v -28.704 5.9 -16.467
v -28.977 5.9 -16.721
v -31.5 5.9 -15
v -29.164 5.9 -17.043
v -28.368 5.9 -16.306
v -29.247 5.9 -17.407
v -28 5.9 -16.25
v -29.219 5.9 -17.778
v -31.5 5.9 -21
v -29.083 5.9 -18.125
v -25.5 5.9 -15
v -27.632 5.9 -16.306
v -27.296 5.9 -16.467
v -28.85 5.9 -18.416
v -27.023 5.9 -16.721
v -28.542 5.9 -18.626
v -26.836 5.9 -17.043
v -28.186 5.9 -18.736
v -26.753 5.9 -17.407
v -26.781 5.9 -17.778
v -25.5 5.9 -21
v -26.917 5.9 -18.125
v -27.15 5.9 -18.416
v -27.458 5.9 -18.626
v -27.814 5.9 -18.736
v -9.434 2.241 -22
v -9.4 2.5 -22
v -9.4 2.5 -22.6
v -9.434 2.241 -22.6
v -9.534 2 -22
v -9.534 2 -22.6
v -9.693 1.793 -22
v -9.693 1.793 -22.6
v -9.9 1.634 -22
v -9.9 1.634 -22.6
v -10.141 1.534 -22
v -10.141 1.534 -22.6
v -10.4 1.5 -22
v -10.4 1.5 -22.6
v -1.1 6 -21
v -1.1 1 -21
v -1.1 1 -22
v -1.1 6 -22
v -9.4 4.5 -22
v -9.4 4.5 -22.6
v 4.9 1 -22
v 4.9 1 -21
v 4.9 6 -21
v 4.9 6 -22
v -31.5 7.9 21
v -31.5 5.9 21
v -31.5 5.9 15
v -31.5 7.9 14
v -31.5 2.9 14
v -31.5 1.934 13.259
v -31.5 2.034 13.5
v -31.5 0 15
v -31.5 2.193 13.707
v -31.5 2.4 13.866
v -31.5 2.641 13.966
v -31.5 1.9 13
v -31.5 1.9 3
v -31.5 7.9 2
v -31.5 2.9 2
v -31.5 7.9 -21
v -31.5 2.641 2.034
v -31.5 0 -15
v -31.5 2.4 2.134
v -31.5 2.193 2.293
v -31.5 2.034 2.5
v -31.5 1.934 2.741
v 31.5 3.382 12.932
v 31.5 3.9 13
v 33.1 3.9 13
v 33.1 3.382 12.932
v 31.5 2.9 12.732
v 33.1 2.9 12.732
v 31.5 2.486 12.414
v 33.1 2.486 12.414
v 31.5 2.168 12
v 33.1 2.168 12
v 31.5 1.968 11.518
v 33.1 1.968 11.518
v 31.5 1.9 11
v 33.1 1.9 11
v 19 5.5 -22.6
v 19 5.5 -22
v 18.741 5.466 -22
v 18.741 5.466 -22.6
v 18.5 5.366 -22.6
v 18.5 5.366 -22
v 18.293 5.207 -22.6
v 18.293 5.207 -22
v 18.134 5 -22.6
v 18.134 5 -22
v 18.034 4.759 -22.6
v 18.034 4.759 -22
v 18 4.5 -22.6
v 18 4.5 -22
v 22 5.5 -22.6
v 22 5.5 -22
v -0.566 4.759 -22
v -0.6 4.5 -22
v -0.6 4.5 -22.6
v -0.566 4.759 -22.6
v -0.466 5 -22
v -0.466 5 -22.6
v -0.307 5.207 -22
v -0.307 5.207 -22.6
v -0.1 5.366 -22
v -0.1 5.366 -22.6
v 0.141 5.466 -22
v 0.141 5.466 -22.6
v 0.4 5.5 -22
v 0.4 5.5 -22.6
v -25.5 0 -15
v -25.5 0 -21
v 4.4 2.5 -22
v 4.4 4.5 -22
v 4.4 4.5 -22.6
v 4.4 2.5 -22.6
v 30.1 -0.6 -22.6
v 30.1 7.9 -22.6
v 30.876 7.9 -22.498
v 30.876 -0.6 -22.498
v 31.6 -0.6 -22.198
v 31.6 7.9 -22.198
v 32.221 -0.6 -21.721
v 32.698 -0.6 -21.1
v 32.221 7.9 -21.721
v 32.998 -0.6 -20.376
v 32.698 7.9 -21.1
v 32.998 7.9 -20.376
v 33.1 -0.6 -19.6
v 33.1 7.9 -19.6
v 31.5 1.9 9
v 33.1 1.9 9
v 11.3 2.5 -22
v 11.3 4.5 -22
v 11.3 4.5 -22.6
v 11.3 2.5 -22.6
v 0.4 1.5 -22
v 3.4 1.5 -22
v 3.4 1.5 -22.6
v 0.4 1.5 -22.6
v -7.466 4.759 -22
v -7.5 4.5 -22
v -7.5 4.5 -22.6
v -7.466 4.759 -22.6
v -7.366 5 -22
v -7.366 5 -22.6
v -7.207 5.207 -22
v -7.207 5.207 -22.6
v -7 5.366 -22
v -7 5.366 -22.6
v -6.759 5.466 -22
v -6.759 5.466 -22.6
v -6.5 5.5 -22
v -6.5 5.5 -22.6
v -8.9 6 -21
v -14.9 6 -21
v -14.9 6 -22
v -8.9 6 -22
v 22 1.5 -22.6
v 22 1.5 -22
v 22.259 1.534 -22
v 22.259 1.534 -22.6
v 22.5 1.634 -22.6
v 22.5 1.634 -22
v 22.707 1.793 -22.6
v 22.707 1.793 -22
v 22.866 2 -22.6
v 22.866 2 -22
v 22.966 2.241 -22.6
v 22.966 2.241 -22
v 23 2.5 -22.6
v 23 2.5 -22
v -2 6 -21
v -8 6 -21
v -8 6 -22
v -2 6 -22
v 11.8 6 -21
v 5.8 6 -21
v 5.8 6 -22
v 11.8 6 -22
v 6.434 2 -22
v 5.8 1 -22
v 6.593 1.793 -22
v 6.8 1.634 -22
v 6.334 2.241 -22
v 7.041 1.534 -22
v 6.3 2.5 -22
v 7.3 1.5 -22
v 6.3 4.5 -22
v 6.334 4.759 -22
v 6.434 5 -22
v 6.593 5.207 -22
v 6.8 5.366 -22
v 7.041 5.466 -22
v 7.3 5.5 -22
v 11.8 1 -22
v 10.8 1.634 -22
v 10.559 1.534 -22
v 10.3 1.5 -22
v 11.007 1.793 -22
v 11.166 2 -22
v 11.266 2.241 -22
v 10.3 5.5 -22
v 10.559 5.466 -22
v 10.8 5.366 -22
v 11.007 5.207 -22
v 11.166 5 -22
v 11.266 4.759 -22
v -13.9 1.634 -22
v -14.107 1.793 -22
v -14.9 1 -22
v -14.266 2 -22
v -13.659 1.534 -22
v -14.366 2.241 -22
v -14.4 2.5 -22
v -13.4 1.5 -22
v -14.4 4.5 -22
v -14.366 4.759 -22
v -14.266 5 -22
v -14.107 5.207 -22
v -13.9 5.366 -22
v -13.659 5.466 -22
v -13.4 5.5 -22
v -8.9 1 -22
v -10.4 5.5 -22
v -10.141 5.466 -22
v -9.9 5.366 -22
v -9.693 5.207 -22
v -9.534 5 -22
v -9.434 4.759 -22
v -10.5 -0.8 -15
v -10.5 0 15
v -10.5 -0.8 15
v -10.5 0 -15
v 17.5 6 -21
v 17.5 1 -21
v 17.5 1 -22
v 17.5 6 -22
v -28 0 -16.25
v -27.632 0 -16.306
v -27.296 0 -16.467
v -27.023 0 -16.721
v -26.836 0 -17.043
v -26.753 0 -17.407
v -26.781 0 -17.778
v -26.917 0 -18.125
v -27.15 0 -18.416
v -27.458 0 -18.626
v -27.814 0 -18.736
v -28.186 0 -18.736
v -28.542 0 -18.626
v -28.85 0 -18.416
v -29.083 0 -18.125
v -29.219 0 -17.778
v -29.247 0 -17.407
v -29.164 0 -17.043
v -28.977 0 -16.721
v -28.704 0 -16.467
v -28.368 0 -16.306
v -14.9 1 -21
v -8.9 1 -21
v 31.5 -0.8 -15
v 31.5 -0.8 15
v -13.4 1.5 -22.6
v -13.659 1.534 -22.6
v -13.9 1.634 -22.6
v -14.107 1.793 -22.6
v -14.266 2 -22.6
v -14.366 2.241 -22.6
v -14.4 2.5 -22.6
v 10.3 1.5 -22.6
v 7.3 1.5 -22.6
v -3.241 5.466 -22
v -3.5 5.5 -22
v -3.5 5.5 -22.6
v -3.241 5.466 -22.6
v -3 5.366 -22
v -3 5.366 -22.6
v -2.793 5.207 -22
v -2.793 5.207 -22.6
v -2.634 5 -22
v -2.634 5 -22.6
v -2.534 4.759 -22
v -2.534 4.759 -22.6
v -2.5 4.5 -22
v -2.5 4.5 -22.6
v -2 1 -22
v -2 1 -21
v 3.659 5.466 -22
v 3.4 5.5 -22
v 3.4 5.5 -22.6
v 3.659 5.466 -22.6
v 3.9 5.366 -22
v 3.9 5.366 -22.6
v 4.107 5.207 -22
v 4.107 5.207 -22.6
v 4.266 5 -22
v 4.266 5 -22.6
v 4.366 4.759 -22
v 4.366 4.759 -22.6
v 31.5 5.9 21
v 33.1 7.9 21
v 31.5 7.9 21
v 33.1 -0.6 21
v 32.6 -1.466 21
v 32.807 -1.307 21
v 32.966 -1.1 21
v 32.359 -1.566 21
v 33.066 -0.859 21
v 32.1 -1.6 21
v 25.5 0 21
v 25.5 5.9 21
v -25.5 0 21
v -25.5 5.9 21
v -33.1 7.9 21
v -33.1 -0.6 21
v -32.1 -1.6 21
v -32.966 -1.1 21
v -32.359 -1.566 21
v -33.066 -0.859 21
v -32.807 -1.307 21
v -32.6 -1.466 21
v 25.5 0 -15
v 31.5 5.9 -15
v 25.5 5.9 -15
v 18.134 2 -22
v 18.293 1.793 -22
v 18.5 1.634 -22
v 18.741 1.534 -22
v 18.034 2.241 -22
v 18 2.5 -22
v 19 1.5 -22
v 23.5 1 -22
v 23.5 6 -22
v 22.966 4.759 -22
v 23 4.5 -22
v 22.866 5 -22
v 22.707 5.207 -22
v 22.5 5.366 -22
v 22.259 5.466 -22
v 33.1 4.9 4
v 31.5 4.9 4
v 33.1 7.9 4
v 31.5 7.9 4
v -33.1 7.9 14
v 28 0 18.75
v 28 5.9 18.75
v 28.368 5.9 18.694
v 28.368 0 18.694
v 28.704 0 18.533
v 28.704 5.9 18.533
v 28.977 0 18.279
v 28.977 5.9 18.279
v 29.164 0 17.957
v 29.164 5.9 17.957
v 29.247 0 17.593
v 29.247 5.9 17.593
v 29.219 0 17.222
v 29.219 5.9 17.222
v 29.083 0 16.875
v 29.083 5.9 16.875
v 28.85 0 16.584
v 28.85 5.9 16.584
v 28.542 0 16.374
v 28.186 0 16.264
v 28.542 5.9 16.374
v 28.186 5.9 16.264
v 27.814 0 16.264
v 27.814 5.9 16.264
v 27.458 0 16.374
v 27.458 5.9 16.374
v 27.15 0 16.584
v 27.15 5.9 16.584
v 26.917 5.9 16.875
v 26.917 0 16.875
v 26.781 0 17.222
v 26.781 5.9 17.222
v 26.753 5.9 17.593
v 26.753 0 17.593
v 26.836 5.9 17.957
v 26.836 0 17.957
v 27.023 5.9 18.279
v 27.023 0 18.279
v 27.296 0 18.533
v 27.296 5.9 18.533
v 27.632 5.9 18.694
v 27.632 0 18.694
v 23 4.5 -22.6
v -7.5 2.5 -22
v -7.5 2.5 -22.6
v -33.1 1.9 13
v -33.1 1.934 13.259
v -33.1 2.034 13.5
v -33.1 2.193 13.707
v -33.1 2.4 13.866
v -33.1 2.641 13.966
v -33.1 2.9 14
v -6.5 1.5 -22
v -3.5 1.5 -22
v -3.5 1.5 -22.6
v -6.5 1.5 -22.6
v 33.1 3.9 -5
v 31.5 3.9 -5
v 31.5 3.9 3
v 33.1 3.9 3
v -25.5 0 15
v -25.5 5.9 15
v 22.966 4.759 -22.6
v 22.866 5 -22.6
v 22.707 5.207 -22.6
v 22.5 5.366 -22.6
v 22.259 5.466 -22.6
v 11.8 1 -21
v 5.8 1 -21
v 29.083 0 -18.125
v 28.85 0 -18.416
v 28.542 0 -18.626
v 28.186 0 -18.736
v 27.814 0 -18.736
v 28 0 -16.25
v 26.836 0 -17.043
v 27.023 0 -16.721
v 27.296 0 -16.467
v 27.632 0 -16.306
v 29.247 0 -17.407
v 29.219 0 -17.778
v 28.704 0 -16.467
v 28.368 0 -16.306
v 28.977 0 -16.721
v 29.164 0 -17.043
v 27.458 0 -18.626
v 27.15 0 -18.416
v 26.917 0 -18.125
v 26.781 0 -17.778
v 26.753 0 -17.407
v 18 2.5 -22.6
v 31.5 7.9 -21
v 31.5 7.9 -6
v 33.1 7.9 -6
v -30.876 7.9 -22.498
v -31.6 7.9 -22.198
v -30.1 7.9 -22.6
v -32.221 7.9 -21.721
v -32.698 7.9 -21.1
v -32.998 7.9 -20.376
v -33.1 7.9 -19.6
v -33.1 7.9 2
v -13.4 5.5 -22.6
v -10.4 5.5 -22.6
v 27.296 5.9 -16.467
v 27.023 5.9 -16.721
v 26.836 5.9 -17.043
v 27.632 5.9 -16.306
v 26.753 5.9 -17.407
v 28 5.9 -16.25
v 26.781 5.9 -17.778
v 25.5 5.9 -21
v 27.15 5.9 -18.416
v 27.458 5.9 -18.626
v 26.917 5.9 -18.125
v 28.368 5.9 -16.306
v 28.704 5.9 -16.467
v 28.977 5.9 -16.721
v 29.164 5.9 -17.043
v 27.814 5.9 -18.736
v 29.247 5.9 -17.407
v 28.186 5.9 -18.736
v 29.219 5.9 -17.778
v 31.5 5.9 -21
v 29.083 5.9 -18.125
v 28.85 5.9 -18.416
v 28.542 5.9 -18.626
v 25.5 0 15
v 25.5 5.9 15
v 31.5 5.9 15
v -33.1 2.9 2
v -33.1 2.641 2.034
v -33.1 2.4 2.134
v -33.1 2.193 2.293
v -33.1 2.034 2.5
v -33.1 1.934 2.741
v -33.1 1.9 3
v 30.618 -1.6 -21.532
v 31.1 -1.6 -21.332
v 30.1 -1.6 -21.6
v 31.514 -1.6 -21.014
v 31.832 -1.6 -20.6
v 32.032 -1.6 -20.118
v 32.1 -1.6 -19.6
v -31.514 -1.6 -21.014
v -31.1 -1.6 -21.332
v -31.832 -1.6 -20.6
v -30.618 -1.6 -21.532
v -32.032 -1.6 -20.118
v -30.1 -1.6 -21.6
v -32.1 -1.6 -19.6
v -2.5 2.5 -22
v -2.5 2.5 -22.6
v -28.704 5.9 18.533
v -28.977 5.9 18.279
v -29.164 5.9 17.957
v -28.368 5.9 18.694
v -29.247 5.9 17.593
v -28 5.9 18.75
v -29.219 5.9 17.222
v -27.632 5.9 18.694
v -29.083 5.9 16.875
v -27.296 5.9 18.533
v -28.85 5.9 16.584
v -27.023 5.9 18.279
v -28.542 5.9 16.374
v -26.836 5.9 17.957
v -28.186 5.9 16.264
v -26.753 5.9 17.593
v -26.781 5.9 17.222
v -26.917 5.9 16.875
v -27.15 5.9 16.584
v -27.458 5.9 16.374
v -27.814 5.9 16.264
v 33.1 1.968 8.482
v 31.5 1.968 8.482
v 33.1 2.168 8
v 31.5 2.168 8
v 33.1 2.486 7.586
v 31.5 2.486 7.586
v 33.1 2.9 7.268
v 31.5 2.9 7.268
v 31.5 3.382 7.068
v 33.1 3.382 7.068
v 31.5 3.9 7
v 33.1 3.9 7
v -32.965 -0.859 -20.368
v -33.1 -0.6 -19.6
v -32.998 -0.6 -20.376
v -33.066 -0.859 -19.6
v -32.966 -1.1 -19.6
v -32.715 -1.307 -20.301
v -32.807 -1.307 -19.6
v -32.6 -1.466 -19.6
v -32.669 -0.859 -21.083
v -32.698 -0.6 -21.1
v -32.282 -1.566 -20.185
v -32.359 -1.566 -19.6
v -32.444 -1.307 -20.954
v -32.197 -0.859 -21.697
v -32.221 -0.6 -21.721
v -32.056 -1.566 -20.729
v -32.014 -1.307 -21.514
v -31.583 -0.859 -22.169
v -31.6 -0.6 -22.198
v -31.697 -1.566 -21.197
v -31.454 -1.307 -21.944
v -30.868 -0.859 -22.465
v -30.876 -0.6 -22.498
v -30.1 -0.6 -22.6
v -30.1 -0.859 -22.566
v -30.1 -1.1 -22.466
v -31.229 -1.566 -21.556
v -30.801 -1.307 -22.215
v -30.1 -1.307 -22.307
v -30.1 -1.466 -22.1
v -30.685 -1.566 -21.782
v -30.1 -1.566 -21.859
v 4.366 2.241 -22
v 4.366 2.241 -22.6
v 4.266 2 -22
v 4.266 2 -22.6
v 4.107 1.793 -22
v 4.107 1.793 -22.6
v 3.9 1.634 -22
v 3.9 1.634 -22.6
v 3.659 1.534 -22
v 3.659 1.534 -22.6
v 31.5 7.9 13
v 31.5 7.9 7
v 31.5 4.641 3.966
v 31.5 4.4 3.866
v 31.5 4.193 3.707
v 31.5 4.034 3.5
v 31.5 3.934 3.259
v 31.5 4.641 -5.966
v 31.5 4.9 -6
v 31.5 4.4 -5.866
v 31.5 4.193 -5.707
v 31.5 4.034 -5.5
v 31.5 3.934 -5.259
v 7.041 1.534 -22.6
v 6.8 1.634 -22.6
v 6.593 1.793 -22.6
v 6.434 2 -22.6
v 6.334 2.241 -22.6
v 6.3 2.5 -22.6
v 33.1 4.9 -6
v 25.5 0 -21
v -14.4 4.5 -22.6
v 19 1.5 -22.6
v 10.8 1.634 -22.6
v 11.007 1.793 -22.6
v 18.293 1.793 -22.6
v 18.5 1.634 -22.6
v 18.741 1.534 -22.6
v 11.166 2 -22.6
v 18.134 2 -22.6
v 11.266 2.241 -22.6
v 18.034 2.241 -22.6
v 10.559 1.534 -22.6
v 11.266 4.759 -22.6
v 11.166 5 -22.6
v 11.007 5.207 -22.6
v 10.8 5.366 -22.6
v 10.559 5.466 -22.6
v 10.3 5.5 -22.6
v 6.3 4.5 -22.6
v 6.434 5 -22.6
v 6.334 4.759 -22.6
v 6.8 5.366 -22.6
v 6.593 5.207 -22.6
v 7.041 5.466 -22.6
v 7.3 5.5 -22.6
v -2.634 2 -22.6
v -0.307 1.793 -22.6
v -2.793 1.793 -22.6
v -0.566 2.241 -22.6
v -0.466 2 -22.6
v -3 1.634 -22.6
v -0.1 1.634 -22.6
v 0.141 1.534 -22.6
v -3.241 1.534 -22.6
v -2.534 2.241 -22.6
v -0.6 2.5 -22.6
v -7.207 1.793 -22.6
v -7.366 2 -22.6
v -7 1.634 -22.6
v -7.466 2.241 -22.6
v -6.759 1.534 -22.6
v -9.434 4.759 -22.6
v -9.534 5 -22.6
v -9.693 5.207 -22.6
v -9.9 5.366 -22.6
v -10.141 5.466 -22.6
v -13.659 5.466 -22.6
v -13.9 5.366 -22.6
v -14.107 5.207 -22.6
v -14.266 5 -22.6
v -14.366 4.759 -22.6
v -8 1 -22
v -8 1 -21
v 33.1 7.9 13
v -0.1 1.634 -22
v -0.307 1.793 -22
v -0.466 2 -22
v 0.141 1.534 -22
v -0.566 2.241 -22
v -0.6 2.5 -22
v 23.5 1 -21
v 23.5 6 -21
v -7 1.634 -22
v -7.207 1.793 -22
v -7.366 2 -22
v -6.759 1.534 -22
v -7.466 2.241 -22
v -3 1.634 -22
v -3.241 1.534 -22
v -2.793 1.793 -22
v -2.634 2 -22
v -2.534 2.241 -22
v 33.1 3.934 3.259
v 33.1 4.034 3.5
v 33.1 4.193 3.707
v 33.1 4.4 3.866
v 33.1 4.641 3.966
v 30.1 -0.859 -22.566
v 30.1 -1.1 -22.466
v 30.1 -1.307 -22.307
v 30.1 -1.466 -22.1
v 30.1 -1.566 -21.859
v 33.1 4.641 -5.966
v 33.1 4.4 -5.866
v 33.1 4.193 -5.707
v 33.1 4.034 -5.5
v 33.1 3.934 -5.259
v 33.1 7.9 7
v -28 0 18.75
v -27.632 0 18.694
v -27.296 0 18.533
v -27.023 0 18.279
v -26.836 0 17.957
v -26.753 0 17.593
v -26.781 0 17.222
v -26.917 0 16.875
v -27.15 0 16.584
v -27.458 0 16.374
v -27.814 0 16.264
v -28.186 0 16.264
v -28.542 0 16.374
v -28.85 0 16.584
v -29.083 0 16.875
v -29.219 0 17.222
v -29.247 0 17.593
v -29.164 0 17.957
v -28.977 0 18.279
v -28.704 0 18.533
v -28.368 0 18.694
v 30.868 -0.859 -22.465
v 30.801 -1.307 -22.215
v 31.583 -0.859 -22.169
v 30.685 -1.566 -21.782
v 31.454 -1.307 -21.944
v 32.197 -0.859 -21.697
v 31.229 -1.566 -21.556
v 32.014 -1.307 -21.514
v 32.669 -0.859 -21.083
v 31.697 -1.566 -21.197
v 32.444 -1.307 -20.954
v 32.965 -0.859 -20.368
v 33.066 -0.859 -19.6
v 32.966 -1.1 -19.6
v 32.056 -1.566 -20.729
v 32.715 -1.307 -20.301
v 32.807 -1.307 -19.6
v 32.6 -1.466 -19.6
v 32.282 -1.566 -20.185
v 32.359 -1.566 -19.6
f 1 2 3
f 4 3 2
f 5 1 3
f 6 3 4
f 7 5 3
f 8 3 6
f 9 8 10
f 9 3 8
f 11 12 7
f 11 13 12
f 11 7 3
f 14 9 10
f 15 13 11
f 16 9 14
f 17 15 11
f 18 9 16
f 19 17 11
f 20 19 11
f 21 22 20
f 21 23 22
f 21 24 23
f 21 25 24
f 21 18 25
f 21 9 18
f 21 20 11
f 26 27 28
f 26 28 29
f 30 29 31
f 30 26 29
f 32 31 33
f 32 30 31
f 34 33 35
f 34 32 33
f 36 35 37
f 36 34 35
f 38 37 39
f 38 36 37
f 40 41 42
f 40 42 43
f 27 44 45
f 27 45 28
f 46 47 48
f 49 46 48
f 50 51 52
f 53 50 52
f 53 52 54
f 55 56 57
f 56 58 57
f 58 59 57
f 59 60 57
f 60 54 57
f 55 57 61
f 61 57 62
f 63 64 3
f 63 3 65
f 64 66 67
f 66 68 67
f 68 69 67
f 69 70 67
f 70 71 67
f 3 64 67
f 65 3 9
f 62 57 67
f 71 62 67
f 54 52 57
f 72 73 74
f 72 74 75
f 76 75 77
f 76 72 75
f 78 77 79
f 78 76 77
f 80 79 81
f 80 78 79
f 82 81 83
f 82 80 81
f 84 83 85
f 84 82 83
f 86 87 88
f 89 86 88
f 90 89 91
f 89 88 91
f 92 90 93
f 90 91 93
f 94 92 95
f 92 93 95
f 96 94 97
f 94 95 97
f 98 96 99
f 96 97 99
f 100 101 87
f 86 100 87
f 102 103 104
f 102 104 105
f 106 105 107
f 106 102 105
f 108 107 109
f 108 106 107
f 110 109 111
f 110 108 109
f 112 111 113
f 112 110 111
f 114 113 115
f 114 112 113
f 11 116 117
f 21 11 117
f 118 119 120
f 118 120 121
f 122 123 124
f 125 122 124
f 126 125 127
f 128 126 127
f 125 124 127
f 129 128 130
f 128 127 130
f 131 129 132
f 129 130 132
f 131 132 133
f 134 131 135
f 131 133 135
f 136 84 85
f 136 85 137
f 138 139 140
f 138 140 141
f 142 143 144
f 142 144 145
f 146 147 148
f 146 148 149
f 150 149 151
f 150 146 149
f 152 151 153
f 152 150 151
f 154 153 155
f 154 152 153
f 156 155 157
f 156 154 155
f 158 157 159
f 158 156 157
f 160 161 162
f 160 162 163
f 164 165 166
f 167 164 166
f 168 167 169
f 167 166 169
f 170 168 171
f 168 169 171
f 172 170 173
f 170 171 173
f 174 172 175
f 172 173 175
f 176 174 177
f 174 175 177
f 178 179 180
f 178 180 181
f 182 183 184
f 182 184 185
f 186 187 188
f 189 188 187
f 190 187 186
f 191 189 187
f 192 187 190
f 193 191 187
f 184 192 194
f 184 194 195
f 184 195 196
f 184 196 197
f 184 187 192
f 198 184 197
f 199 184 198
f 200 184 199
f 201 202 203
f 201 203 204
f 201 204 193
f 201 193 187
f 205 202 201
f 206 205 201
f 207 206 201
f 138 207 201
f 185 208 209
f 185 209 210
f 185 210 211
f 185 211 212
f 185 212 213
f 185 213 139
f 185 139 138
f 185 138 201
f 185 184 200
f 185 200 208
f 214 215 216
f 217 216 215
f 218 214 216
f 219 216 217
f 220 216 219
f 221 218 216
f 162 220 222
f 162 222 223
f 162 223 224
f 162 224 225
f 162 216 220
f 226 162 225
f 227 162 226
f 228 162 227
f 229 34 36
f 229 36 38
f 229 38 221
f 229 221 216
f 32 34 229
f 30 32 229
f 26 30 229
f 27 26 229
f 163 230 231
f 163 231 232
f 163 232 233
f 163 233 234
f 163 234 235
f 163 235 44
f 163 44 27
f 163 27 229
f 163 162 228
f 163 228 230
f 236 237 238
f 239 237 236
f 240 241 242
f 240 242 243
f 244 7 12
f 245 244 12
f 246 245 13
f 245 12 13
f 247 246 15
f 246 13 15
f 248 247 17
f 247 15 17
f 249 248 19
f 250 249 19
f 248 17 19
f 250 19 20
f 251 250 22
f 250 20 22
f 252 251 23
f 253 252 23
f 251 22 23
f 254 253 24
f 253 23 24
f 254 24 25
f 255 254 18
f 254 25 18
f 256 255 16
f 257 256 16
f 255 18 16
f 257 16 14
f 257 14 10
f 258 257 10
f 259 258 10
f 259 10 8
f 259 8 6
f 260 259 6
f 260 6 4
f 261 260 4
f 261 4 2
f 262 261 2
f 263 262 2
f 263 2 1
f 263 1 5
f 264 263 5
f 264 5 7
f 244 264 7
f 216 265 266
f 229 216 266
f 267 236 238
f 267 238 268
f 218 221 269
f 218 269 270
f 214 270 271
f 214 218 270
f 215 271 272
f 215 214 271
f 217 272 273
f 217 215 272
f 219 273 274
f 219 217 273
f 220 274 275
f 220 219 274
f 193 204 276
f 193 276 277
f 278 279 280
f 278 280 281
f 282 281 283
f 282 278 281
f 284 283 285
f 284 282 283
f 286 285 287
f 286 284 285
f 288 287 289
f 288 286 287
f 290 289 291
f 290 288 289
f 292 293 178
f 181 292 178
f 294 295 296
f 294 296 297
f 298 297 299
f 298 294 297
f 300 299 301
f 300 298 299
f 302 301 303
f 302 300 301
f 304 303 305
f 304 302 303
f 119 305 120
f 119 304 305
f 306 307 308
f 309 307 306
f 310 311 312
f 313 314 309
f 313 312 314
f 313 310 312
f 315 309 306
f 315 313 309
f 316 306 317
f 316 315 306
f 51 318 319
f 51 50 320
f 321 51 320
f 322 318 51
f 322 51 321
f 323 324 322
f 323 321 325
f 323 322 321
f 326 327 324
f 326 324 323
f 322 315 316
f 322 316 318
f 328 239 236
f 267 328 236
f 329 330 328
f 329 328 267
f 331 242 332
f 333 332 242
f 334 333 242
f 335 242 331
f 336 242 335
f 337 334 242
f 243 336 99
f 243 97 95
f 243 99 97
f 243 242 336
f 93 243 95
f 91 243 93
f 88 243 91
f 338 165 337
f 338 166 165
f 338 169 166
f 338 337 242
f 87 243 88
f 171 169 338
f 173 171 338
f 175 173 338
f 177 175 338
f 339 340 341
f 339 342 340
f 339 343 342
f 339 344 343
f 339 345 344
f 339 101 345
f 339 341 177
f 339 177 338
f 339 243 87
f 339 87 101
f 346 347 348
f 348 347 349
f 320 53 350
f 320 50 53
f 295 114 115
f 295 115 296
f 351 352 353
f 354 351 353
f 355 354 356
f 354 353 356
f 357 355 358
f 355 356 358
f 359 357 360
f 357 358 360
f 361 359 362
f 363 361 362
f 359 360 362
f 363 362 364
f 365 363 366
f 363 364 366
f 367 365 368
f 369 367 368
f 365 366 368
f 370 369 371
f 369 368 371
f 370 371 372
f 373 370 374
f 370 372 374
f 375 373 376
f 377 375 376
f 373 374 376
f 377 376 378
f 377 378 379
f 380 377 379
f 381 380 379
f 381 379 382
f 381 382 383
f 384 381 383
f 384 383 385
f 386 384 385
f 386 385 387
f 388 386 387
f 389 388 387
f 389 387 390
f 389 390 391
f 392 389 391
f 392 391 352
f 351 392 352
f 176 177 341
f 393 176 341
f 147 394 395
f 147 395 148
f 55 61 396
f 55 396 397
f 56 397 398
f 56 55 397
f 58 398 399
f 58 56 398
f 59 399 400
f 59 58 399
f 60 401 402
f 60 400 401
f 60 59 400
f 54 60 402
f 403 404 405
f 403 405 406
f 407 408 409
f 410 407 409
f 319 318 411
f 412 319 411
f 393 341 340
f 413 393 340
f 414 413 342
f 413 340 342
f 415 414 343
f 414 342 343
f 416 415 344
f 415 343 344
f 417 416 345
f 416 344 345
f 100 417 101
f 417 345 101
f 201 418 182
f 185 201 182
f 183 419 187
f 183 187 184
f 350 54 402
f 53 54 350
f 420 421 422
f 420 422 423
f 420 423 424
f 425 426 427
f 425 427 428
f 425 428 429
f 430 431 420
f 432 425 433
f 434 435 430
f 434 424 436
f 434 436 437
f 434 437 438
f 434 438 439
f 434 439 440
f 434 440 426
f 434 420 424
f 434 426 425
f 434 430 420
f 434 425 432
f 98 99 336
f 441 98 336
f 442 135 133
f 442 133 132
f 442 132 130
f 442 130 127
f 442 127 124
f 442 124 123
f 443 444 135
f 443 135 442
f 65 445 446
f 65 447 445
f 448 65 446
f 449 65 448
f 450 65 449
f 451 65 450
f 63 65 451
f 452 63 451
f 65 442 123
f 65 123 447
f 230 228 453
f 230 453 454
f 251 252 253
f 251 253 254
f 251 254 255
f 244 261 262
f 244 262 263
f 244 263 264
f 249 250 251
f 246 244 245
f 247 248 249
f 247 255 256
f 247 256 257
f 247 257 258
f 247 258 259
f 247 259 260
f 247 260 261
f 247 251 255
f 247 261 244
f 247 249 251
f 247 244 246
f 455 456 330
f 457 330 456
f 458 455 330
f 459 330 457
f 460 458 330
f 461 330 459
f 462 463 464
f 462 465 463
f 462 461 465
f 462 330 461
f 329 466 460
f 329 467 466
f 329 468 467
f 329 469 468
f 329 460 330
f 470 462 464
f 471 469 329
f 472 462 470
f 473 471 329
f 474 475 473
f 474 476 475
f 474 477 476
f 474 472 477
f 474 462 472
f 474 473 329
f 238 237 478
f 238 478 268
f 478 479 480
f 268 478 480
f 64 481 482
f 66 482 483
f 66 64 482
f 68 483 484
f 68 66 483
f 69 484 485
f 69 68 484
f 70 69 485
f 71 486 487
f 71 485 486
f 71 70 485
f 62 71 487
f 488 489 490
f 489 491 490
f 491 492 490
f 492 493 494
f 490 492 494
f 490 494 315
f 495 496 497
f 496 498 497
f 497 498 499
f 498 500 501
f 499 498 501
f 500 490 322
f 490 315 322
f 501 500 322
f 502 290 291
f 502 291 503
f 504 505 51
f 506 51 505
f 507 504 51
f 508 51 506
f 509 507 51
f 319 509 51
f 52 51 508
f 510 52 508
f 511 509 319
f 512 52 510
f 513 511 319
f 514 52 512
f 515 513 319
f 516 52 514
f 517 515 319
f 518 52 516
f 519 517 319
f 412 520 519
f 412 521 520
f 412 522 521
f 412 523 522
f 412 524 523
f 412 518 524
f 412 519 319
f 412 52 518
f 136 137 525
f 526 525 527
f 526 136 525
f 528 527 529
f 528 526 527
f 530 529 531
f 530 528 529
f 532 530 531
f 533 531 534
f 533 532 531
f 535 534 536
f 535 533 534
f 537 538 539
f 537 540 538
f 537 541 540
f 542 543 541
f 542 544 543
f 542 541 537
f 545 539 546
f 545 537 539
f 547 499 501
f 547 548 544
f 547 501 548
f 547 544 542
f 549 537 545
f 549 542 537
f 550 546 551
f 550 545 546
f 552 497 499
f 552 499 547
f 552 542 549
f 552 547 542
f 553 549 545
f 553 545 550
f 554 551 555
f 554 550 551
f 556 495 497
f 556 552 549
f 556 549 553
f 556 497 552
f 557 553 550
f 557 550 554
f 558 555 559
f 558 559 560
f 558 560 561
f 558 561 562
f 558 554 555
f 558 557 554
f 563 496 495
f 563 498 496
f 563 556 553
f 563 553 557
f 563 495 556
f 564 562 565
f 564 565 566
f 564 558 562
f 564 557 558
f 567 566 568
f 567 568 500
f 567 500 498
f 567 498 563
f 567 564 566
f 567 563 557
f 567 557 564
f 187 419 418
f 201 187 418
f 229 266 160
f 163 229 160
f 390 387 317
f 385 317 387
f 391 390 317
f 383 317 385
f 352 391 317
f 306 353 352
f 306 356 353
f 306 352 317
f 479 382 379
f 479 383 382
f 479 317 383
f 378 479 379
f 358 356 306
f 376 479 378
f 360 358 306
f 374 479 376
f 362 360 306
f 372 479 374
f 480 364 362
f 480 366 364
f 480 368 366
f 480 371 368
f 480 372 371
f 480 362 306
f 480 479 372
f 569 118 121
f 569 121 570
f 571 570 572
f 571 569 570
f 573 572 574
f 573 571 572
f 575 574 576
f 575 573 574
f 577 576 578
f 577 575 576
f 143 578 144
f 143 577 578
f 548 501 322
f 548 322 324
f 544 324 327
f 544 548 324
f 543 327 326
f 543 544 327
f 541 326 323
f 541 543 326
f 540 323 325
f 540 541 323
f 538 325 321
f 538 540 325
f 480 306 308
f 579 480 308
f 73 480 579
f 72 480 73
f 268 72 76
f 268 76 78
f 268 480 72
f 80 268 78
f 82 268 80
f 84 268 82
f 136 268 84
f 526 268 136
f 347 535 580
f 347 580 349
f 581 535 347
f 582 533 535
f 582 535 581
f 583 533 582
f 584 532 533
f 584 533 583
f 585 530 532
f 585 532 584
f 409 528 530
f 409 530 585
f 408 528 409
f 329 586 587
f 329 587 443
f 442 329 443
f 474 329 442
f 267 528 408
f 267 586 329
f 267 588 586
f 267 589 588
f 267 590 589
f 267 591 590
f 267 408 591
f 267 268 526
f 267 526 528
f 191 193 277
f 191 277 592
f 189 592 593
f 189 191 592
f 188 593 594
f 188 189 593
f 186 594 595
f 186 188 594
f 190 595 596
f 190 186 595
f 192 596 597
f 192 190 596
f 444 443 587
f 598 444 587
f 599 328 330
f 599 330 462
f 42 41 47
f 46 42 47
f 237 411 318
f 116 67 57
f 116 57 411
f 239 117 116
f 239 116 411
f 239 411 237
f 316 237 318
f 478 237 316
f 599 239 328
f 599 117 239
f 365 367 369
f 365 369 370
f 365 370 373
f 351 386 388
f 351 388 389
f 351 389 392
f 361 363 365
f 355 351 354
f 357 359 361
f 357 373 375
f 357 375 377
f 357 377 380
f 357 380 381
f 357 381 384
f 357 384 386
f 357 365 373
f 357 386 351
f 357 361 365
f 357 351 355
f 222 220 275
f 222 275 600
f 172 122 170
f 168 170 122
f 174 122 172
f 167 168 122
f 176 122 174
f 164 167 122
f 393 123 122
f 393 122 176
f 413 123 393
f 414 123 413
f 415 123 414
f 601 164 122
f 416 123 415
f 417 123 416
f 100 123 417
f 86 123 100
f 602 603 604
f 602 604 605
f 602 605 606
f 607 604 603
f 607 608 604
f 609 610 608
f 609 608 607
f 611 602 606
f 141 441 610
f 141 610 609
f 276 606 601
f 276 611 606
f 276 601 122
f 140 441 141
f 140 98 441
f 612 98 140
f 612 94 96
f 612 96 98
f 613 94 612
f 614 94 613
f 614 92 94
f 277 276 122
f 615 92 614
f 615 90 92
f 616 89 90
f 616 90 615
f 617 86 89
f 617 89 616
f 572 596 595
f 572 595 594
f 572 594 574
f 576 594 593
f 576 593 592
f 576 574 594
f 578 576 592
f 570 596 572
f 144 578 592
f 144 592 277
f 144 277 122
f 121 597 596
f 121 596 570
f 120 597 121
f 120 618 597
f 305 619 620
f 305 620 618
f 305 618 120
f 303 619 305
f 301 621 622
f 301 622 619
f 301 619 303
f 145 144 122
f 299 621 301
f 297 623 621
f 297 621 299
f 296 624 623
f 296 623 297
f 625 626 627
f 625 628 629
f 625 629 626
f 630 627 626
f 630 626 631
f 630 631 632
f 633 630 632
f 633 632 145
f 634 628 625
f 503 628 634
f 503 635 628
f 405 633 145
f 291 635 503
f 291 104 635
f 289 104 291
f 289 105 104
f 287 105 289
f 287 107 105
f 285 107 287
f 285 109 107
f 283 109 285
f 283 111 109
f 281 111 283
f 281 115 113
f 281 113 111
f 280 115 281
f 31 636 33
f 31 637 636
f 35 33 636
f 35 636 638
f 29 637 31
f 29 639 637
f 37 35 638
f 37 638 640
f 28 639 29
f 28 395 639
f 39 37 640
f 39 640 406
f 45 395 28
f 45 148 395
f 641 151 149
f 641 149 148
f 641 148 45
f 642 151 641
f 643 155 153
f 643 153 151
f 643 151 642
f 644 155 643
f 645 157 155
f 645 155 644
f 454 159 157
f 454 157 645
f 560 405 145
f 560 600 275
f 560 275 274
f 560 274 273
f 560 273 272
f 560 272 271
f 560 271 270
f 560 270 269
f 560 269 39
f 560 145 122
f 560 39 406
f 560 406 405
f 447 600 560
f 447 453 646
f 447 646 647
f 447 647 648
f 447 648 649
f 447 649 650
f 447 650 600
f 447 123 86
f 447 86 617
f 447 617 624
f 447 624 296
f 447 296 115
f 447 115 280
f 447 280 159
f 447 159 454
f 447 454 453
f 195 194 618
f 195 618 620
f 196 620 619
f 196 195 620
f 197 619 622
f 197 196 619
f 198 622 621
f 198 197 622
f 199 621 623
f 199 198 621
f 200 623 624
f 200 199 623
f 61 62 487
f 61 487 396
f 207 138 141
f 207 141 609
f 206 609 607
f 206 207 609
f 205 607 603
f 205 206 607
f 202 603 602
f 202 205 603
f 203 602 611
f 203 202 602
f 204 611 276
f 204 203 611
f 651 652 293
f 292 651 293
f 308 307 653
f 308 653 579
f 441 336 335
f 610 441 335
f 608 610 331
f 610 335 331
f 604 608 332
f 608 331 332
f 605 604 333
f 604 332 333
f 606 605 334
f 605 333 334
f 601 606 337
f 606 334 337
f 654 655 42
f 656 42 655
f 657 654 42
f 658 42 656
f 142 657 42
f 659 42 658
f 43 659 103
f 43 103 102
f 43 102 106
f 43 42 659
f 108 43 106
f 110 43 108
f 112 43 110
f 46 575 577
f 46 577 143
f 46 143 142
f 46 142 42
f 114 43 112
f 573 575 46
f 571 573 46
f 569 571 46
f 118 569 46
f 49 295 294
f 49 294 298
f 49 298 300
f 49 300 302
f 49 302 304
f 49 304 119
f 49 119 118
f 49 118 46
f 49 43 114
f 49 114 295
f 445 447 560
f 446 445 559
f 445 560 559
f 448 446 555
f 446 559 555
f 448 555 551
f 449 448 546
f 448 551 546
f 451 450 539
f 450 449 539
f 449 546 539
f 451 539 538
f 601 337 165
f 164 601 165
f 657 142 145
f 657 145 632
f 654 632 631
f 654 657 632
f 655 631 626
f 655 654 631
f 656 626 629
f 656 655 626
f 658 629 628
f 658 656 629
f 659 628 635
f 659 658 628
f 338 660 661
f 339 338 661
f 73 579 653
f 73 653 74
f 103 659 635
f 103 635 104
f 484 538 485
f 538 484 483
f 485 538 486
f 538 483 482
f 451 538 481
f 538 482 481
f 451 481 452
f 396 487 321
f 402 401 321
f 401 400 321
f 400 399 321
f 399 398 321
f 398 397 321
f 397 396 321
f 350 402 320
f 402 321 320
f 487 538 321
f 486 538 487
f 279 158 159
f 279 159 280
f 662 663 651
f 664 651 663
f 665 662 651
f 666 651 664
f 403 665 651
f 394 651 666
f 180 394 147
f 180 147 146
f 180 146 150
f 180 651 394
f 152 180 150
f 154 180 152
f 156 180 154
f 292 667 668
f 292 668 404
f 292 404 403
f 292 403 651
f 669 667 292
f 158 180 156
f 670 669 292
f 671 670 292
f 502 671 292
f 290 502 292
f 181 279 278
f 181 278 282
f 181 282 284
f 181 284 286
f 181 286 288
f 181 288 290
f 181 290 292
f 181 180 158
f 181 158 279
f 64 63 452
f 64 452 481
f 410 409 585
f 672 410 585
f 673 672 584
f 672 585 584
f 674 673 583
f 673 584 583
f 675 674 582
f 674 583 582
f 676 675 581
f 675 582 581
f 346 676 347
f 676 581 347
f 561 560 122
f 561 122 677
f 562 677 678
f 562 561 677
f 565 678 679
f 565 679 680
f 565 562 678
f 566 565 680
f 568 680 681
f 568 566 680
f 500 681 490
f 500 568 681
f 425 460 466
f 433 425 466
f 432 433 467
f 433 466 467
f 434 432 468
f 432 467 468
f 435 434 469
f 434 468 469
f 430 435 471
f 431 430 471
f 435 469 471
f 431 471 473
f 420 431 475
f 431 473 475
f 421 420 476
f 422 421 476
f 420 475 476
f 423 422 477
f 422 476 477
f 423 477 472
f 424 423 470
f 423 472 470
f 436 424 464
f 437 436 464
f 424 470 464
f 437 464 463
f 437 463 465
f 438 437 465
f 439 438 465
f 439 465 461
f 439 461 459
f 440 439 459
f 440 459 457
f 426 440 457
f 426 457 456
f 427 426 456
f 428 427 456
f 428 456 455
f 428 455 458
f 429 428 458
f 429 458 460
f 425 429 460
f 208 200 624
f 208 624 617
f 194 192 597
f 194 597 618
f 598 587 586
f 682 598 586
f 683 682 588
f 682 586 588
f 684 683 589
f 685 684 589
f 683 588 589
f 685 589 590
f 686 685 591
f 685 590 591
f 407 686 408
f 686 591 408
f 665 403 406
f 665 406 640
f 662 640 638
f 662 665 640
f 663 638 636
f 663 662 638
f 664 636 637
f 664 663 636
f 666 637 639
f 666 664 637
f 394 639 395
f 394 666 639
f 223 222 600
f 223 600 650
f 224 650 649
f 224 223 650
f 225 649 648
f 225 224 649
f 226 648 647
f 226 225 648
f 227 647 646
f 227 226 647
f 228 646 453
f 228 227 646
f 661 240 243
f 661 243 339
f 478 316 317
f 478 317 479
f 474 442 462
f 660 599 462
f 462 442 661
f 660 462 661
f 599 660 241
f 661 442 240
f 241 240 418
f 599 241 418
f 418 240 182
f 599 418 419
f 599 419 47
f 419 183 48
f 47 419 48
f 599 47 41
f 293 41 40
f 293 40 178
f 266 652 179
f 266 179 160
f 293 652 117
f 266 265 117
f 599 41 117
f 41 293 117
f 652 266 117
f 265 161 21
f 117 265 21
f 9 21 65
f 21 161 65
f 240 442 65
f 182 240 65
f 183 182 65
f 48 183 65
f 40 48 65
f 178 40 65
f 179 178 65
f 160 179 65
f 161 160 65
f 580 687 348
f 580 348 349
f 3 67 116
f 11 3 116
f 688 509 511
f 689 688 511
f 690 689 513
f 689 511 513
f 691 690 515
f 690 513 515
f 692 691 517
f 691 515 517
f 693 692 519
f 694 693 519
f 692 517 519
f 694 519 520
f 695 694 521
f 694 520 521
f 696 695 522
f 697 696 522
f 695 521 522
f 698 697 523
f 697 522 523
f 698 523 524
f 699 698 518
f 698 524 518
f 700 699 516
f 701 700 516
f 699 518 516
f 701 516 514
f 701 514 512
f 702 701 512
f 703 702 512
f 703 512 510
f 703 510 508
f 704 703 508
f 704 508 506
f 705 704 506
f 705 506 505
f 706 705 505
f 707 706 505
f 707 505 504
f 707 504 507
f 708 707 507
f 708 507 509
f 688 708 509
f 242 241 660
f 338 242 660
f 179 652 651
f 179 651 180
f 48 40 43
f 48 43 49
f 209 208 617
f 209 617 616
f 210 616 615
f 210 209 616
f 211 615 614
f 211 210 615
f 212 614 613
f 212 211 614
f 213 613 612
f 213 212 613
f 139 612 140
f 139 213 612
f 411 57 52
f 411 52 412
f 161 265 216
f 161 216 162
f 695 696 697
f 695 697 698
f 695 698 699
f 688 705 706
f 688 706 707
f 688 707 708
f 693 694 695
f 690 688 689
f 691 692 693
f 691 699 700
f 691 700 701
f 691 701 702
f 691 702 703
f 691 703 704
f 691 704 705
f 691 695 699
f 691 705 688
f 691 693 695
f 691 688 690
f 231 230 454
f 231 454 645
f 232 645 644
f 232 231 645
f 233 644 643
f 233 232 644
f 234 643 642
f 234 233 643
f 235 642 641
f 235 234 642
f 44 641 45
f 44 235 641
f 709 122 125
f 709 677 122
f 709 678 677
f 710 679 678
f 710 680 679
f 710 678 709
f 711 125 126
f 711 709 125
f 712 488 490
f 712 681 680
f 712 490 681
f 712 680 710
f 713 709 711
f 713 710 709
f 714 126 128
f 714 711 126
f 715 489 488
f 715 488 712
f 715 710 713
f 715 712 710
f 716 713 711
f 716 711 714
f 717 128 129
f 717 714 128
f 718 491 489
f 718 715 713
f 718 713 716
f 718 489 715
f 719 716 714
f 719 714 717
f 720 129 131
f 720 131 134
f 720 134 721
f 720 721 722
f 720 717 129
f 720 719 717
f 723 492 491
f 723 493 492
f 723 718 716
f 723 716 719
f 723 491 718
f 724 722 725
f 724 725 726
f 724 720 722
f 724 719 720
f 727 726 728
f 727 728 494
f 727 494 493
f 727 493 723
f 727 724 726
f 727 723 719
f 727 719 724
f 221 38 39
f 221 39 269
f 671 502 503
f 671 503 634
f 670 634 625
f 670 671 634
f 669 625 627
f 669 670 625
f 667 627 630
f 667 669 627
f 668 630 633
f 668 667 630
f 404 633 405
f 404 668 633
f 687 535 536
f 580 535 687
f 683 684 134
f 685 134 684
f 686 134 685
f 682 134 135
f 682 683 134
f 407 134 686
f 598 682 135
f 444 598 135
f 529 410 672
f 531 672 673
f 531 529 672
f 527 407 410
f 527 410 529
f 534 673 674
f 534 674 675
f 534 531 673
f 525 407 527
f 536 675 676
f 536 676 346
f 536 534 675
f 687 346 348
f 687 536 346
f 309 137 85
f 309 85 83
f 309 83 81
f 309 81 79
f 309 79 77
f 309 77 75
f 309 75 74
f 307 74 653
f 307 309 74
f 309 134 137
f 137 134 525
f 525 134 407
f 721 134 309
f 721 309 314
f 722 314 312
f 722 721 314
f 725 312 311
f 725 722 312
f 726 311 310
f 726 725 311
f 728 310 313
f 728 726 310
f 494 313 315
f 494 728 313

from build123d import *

# Parameters (mm, degrees)
SKETCH_1_W             = 63
SKETCH_1_H             = 42
EXTRUDE_298_DEPTH      = 1.6
SKETCH_2_W             = 42
SKETCH_2_H             = 30
CUT_EXTRUDE_670_DEPTH  = 0.8
SKETCH_4_W             = 1.6
SKETCH_4_H             = 42
EXTRUDE_914_DEPTH      = 9.5
SKETCH_5_W             = 6
SKETCH_5_H             = 6
EXTRUDE_1303_DEPTH     = 5.9
SKETCH_6_R             = 1.25
CUT_EXTRUDE_1636_DEPTH = 7.9
SKETCH_9_W             = 66.2
SKETCH_9_H             = 9.5
EXTRUDE_4_DEPTH        = 1.6
SKETCH_10_W            = 6
SKETCH_10_H            = 5
CUT_EXTRUDE_2759_DEPTH = 1
CUT_EXTRUDE_3267_REACH = 56.836
FILLET_4_R             = 1
FILLET_5_R             = 3
TF_REACH               = 70.894
CUT_EXTRUDE_1_REACH    = 70.894


with BuildPart() as part:
    # 草图1 → Extrude 298 (new body)
    with BuildSketch(Plane(origin=(0, 0, 0), x_dir=(1, 0, 0), z_dir=(0, 1, 0))):
        Rectangle(SKETCH_1_W, SKETCH_1_H)
    extrude(amount=-EXTRUDE_298_DEPTH)

    # 草图2 → Cut-Extrude 670 (cut)
    with BuildSketch(Plane(origin=(0, 0, 0), x_dir=(1, 0, 0), z_dir=(0, 1, 0))):
        with Locations((10.5, 0)):
            Rectangle(SKETCH_2_W, SKETCH_2_H)
    extrude(amount=-CUT_EXTRUDE_670_DEPTH, mode=Mode.SUBTRACT)

    # 草图4 → Extrude 914 (add)
    with BuildSketch(Plane(origin=(0, -1.6, 0), x_dir=(-1, 0, 0), z_dir=(0, -1, 0))):
        with Locations((-32.3, 0)):
            Rectangle(SKETCH_4_W, SKETCH_4_H)
        with Locations((32.3, 0)):
            Rectangle(SKETCH_4_W, SKETCH_4_H)
    extrude(amount=-EXTRUDE_914_DEPTH)

    # 草图5 → Extrude 1303 (add)
    with BuildSketch(Plane(origin=(0, 0, 0), x_dir=(1, 0, 0), z_dir=(0, 1, 0))):
        with Locations((-28.5, 18)):
            Rectangle(SKETCH_5_W, SKETCH_5_H)
        with Locations((28.5, 18)):
            Rectangle(SKETCH_5_W, SKETCH_5_H)
        with Locations((-28.5, -18)):
            Rectangle(SKETCH_5_W, SKETCH_5_H)
        with Locations((28.5, -18)):
            Rectangle(SKETCH_5_W, SKETCH_5_H)
    extrude(amount=EXTRUDE_1303_DEPTH)

    # 草图6 → Cut-Extrude 1636 (cut)
    with BuildSketch(Plane(origin=(0, 7.9, 0), x_dir=(1, 0, 0), z_dir=(0, 1, 0))):
        with Locations(Location((-28, 17.5, 0), (0, 0, 270))):
            Circle(SKETCH_6_R)
        with Locations(Location((28, 17.5, 0), (0, 0, 270))):
            Circle(SKETCH_6_R)
        with Locations(Location((28, -17.5, 0), (0, 0, 270))):
            Circle(SKETCH_6_R)
        with Locations(Location((-28, -17.5, 0), (0, 0, 270))):
            Circle(SKETCH_6_R)
    extrude(amount=-CUT_EXTRUDE_1636_DEPTH, mode=Mode.SUBTRACT)

    # 草图9 → 凸台-拉伸4 (add)
    with BuildSketch(Plane(origin=(0, 0, -21), x_dir=(-1, 0, 0), z_dir=(0, 0, -1))):
        with Locations((0, 3.15)):
            Rectangle(SKETCH_9_W, SKETCH_9_H)
    extrude(amount=EXTRUDE_4_DEPTH)

    # 草图10 → Cut-Extrude 2759 (cut)
    with BuildSketch(Plane.XY.offset(-21)):
        with Locations((20.5, 3.5)):
            Rectangle(SKETCH_10_W, SKETCH_10_H)
        with Locations((8.8, 3.5)):
            Rectangle(SKETCH_10_W, SKETCH_10_H)
        with Locations((1.9, 3.5)):
            Rectangle(SKETCH_10_W, SKETCH_10_H)
        with Locations((-5, 3.5)):
            Rectangle(SKETCH_10_W, SKETCH_10_H)
        with Locations((-11.9, 3.5)):
            Rectangle(SKETCH_10_W, SKETCH_10_H)
    extrude(amount=-CUT_EXTRUDE_2759_DEPTH, mode=Mode.SUBTRACT)

    # 草图12 → Cut-Extrude 3267 (cut, up to next)
    with BuildSketch(Plane.XY.offset(-22), mode=Mode.PRIVATE) as cut_extrude_3267_sk1:
        with BuildLine():
            Line((6.3, 2.5), (6.3, 4.5))
            ThreePointArc((6.3, 4.5), (6.592893219, 5.207106781), (7.3, 5.5))
            Line((7.3, 5.5), (10.3, 5.5))
            ThreePointArc((10.3, 5.5), (11.007106781, 5.207106781), (11.3, 4.5))
            Line((11.3, 4.5), (11.3, 2.5))
            ThreePointArc((11.3, 2.5), (11.007106781, 1.792893219), (10.3, 1.5))
            Line((10.3, 1.5), (7.3, 1.5))
            ThreePointArc((7.3, 1.5), (6.592893219, 1.792893219), (6.3, 2.5))
        make_face()
    cut_extrude_3267_tool1 = extrude(cut_extrude_3267_sk1.sketch, amount=-CUT_EXTRUDE_3267_REACH, mode=Mode.PRIVATE) & part.part
    # 草图12 → Cut-Extrude 3267 (cut, up to next)
    with BuildSketch(Plane.XY.offset(-22), mode=Mode.PRIVATE) as cut_extrude_3267_sk2:
        with BuildLine():
            Line((19, 1.5), (22, 1.5))
            ThreePointArc((22, 1.5), (22.707106781, 1.792893219), (23, 2.5))
            Line((23, 2.5), (23, 4.5))
            ThreePointArc((23, 4.5), (22.707106781, 5.207106781), (22, 5.5))
            Line((22, 5.5), (19, 5.5))
            ThreePointArc((19, 5.5), (18.292893219, 5.207106781), (18, 4.5))
            Line((18, 4.5), (18, 2.5))
            ThreePointArc((18, 2.5), (18.292893219, 1.792893219), (19, 1.5))
        make_face()
    cut_extrude_3267_tool2 = extrude(cut_extrude_3267_sk2.sketch, amount=-CUT_EXTRUDE_3267_REACH, mode=Mode.PRIVATE) & part.part
    # 草图12 → Cut-Extrude 3267 (cut, up to next)
    with BuildSketch(Plane.XY.offset(-22), mode=Mode.PRIVATE) as cut_extrude_3267_sk3:
        with BuildLine():
            Line((-0.6, 2.5), (-0.6, 4.5))
            ThreePointArc((-0.6, 4.5), (-0.307106781, 5.207106781), (0.4, 5.5))
            Line((0.4, 5.5), (3.4, 5.5))
            ThreePointArc((3.4, 5.5), (4.107106781, 5.207106781), (4.4, 4.5))
            Line((4.4, 4.5), (4.4, 2.5))
            ThreePointArc((4.4, 2.5), (4.107106781, 1.792893219), (3.4, 1.5))
            Line((3.4, 1.5), (0.4, 1.5))
            ThreePointArc((0.4, 1.5), (-0.307106781, 1.792893219), (-0.6, 2.5))
        make_face()
    cut_extrude_3267_tool3 = extrude(cut_extrude_3267_sk3.sketch, amount=-CUT_EXTRUDE_3267_REACH, mode=Mode.PRIVATE) & part.part
    # 草图12 → Cut-Extrude 3267 (cut, up to next)
    with BuildSketch(Plane.XY.offset(-22), mode=Mode.PRIVATE) as cut_extrude_3267_sk4:
        with BuildLine():
            Line((-7.5, 2.5), (-7.5, 4.5))
            ThreePointArc((-7.5, 4.5), (-7.207106781, 5.207106781), (-6.5, 5.5))
            Line((-6.5, 5.5), (-3.5, 5.5))
            ThreePointArc((-3.5, 5.5), (-2.792893219, 5.207106781), (-2.5, 4.5))
            Line((-2.5, 4.5), (-2.5, 2.5))
            ThreePointArc((-2.5, 2.5), (-2.792893219, 1.792893219), (-3.5, 1.5))
            Line((-3.5, 1.5), (-6.5, 1.5))
            ThreePointArc((-6.5, 1.5), (-7.207106781, 1.792893219), (-7.5, 2.5))
        make_face()
    cut_extrude_3267_tool4 = extrude(cut_extrude_3267_sk4.sketch, amount=-CUT_EXTRUDE_3267_REACH, mode=Mode.PRIVATE) & part.part
    # 草图12 → Cut-Extrude 3267 (cut, up to next)
    with BuildSketch(Plane.XY.offset(-22), mode=Mode.PRIVATE) as cut_extrude_3267_sk5:
        with BuildLine():
            Line((-14.4, 2.5), (-14.4, 4.5))
            ThreePointArc((-14.4, 4.5), (-14.107106781, 5.207106781), (-13.4, 5.5))
            Line((-13.4, 5.5), (-10.4, 5.5))
            ThreePointArc((-10.4, 5.5), (-9.692893219, 5.207106781), (-9.4, 4.5))
            Line((-9.4, 4.5), (-9.4, 2.5))
            ThreePointArc((-9.4, 2.5), (-9.692893219, 1.792893219), (-10.4, 1.5))
            Line((-10.4, 1.5), (-13.4, 1.5))
            ThreePointArc((-13.4, 1.5), (-14.107106781, 1.792893219), (-14.4, 2.5))
        make_face()
    cut_extrude_3267_tool5 = extrude(cut_extrude_3267_sk5.sketch, amount=-CUT_EXTRUDE_3267_REACH, mode=Mode.PRIVATE) & part.part
    add(cut_extrude_3267_tool1.solids().sort_by_distance((8.8, 3.5, -22))[0], mode=Mode.SUBTRACT)
    add(cut_extrude_3267_tool2.solids().sort_by_distance((20.5, 3.5, -22))[0], mode=Mode.SUBTRACT)
    add(cut_extrude_3267_tool3.solids().sort_by_distance((1.9, 3.5, -22))[0], mode=Mode.SUBTRACT)
    add(cut_extrude_3267_tool4.solids().sort_by_distance((-5, 3.5, -22))[0], mode=Mode.SUBTRACT)
    add(cut_extrude_3267_tool5.solids().sort_by_distance((-11.9, 3.5, -22))[0], mode=Mode.SUBTRACT)

    # 圆角4
    fillet_4_edges = [part.edges().sort_by_distance(p)[0] for p in [
        (0, -1.6, -22.6),
        (33.1, -1.6, -0.8),
        (-33.1, -1.6, -0.8),
    ]]
    fillet(fillet_4_edges, radius=FILLET_4_R)

    # 圆角5
    # the kernel refuses this fillet: 3 mm, written as the material it takes off along each edge
    with BuildSketch(Plane(origin=(30.1, -1.6, -19.6), x_dir=(0, 0, -1), z_dir=(-1, 0, 0))) as fillet_5_piece_1:
        with BuildLine():
            CenterArc((2, -1), 1, 0, 90)
            Line((3, -1), (3, 0))
            Line((3, 0), (2, 0))
        make_face()
    revolve(axis=Axis((30.1, -1.6, -19.6), (0, -1, 0)), revolution_arc=90, mode=Mode.SUBTRACT)
    with BuildSketch(Plane(origin=(-30.1, -1.6, -19.6), x_dir=(-1, 0, 0), z_dir=(0, 0, 1))) as fillet_5_piece_2:
        with BuildLine():
            CenterArc((2, -1), 1, 0, 90)
            Line((3, -1), (3, 0))
            Line((3, 0), (2, 0))
        make_face()
    revolve(axis=Axis((-30.1, -1.6, -19.6), (0, -1, 0)), revolution_arc=90, mode=Mode.SUBTRACT)
    with BuildSketch(Plane(origin=(33.1, 15.4, -22.6), x_dir=(0, 0, 1), z_dir=(0, -1, 0)), Plane(origin=(-33.1, -1.6, -22.6), x_dir=(0, 0, 1), z_dir=(0, 1, 0))) as fillet_5_piece_3:
        with BuildLine():
            CenterArc((FILLET_5_R, FILLET_5_R), FILLET_5_R, 180, 90)
            Line((0, FILLET_5_R), (0, 0))
            Line((0, 0), (FILLET_5_R, 0))
        make_face()
    extrude(amount=17, mode=Mode.SUBTRACT)

    # 草图16 → tf (cut, up to next)
    with BuildSketch(Plane(origin=(-31.5, 0, 0), x_dir=(0, 0, -1), z_dir=(1, 0, 0)), mode=Mode.PRIVATE) as tf_sk1:
        with BuildLine():
            Line((-14, 7.9), (-2, 7.9))
            Line((-2, 7.9), (-2, 2.9))
            ThreePointArc((-2, 2.9), (-2.292893219, 2.192893219), (-3, 1.9))
            Line((-3, 1.9), (-13, 1.9))
            ThreePointArc((-13, 1.9), (-13.707106781, 2.192893219), (-14, 2.9))
            Line((-14, 2.9), (-14, 7.9))
        make_face()
    tf_tool1 = extrude(tf_sk1.sketch, amount=-TF_REACH, mode=Mode.PRIVATE) & part.part
    add(tf_tool1.solids().sort_by_distance((-31.5, 4.916651, 8))[0], mode=Mode.SUBTRACT)

    # 草图17 → 切除-拉伸1 (cut, up to next)
    with BuildSketch(Plane.ZY.offset(-31.5), mode=Mode.PRIVATE) as cut_extrude_1_sk1:
        with BuildLine():
            Line((7, 7.9), (13, 7.9))
            Line((13, 7.9), (13, 3.9))
            ThreePointArc((13, 3.9), (12.414213562, 2.485786438), (11, 1.9))
            Line((11, 1.9), (9, 1.9))
            ThreePointArc((9, 1.9), (7.585786438, 2.485786438), (7, 3.9))
            Line((7, 3.9), (7, 7.9))
        make_face()
    cut_extrude_1_tool1 = extrude(cut_extrude_1_sk1.sketch, amount=-CUT_EXTRUDE_1_REACH, mode=Mode.PRIVATE) & part.part
    # 草图17 → 切除-拉伸1 (cut, up to next)
    with BuildSketch(Plane.ZY.offset(-31.5), mode=Mode.PRIVATE) as cut_extrude_1_sk2:
        with BuildLine():
            Line((4, 7.9), (-6, 7.9))
            Line((-6, 7.9), (-6, 4.9))
            ThreePointArc((-6, 4.9), (-5.707106781, 4.192893219), (-5, 3.9))
            Line((-5, 3.9), (3, 3.9))
            ThreePointArc((3, 3.9), (3.707106781, 4.192893219), (4, 4.9))
            Line((4, 4.9), (4, 7.9))
        make_face()
    cut_extrude_1_tool2 = extrude(cut_extrude_1_sk2.sketch, amount=-CUT_EXTRUDE_1_REACH, mode=Mode.PRIVATE) & part.part
    add(cut_extrude_1_tool1.solids().sort_by_distance((31.5, 5.027861, 10))[0], mode=Mode.SUBTRACT)
    add(cut_extrude_1_tool2.solids().sort_by_distance((31.5, 5.91927, -1))[0], mode=Mode.SUBTRACT)


solid = part.part
